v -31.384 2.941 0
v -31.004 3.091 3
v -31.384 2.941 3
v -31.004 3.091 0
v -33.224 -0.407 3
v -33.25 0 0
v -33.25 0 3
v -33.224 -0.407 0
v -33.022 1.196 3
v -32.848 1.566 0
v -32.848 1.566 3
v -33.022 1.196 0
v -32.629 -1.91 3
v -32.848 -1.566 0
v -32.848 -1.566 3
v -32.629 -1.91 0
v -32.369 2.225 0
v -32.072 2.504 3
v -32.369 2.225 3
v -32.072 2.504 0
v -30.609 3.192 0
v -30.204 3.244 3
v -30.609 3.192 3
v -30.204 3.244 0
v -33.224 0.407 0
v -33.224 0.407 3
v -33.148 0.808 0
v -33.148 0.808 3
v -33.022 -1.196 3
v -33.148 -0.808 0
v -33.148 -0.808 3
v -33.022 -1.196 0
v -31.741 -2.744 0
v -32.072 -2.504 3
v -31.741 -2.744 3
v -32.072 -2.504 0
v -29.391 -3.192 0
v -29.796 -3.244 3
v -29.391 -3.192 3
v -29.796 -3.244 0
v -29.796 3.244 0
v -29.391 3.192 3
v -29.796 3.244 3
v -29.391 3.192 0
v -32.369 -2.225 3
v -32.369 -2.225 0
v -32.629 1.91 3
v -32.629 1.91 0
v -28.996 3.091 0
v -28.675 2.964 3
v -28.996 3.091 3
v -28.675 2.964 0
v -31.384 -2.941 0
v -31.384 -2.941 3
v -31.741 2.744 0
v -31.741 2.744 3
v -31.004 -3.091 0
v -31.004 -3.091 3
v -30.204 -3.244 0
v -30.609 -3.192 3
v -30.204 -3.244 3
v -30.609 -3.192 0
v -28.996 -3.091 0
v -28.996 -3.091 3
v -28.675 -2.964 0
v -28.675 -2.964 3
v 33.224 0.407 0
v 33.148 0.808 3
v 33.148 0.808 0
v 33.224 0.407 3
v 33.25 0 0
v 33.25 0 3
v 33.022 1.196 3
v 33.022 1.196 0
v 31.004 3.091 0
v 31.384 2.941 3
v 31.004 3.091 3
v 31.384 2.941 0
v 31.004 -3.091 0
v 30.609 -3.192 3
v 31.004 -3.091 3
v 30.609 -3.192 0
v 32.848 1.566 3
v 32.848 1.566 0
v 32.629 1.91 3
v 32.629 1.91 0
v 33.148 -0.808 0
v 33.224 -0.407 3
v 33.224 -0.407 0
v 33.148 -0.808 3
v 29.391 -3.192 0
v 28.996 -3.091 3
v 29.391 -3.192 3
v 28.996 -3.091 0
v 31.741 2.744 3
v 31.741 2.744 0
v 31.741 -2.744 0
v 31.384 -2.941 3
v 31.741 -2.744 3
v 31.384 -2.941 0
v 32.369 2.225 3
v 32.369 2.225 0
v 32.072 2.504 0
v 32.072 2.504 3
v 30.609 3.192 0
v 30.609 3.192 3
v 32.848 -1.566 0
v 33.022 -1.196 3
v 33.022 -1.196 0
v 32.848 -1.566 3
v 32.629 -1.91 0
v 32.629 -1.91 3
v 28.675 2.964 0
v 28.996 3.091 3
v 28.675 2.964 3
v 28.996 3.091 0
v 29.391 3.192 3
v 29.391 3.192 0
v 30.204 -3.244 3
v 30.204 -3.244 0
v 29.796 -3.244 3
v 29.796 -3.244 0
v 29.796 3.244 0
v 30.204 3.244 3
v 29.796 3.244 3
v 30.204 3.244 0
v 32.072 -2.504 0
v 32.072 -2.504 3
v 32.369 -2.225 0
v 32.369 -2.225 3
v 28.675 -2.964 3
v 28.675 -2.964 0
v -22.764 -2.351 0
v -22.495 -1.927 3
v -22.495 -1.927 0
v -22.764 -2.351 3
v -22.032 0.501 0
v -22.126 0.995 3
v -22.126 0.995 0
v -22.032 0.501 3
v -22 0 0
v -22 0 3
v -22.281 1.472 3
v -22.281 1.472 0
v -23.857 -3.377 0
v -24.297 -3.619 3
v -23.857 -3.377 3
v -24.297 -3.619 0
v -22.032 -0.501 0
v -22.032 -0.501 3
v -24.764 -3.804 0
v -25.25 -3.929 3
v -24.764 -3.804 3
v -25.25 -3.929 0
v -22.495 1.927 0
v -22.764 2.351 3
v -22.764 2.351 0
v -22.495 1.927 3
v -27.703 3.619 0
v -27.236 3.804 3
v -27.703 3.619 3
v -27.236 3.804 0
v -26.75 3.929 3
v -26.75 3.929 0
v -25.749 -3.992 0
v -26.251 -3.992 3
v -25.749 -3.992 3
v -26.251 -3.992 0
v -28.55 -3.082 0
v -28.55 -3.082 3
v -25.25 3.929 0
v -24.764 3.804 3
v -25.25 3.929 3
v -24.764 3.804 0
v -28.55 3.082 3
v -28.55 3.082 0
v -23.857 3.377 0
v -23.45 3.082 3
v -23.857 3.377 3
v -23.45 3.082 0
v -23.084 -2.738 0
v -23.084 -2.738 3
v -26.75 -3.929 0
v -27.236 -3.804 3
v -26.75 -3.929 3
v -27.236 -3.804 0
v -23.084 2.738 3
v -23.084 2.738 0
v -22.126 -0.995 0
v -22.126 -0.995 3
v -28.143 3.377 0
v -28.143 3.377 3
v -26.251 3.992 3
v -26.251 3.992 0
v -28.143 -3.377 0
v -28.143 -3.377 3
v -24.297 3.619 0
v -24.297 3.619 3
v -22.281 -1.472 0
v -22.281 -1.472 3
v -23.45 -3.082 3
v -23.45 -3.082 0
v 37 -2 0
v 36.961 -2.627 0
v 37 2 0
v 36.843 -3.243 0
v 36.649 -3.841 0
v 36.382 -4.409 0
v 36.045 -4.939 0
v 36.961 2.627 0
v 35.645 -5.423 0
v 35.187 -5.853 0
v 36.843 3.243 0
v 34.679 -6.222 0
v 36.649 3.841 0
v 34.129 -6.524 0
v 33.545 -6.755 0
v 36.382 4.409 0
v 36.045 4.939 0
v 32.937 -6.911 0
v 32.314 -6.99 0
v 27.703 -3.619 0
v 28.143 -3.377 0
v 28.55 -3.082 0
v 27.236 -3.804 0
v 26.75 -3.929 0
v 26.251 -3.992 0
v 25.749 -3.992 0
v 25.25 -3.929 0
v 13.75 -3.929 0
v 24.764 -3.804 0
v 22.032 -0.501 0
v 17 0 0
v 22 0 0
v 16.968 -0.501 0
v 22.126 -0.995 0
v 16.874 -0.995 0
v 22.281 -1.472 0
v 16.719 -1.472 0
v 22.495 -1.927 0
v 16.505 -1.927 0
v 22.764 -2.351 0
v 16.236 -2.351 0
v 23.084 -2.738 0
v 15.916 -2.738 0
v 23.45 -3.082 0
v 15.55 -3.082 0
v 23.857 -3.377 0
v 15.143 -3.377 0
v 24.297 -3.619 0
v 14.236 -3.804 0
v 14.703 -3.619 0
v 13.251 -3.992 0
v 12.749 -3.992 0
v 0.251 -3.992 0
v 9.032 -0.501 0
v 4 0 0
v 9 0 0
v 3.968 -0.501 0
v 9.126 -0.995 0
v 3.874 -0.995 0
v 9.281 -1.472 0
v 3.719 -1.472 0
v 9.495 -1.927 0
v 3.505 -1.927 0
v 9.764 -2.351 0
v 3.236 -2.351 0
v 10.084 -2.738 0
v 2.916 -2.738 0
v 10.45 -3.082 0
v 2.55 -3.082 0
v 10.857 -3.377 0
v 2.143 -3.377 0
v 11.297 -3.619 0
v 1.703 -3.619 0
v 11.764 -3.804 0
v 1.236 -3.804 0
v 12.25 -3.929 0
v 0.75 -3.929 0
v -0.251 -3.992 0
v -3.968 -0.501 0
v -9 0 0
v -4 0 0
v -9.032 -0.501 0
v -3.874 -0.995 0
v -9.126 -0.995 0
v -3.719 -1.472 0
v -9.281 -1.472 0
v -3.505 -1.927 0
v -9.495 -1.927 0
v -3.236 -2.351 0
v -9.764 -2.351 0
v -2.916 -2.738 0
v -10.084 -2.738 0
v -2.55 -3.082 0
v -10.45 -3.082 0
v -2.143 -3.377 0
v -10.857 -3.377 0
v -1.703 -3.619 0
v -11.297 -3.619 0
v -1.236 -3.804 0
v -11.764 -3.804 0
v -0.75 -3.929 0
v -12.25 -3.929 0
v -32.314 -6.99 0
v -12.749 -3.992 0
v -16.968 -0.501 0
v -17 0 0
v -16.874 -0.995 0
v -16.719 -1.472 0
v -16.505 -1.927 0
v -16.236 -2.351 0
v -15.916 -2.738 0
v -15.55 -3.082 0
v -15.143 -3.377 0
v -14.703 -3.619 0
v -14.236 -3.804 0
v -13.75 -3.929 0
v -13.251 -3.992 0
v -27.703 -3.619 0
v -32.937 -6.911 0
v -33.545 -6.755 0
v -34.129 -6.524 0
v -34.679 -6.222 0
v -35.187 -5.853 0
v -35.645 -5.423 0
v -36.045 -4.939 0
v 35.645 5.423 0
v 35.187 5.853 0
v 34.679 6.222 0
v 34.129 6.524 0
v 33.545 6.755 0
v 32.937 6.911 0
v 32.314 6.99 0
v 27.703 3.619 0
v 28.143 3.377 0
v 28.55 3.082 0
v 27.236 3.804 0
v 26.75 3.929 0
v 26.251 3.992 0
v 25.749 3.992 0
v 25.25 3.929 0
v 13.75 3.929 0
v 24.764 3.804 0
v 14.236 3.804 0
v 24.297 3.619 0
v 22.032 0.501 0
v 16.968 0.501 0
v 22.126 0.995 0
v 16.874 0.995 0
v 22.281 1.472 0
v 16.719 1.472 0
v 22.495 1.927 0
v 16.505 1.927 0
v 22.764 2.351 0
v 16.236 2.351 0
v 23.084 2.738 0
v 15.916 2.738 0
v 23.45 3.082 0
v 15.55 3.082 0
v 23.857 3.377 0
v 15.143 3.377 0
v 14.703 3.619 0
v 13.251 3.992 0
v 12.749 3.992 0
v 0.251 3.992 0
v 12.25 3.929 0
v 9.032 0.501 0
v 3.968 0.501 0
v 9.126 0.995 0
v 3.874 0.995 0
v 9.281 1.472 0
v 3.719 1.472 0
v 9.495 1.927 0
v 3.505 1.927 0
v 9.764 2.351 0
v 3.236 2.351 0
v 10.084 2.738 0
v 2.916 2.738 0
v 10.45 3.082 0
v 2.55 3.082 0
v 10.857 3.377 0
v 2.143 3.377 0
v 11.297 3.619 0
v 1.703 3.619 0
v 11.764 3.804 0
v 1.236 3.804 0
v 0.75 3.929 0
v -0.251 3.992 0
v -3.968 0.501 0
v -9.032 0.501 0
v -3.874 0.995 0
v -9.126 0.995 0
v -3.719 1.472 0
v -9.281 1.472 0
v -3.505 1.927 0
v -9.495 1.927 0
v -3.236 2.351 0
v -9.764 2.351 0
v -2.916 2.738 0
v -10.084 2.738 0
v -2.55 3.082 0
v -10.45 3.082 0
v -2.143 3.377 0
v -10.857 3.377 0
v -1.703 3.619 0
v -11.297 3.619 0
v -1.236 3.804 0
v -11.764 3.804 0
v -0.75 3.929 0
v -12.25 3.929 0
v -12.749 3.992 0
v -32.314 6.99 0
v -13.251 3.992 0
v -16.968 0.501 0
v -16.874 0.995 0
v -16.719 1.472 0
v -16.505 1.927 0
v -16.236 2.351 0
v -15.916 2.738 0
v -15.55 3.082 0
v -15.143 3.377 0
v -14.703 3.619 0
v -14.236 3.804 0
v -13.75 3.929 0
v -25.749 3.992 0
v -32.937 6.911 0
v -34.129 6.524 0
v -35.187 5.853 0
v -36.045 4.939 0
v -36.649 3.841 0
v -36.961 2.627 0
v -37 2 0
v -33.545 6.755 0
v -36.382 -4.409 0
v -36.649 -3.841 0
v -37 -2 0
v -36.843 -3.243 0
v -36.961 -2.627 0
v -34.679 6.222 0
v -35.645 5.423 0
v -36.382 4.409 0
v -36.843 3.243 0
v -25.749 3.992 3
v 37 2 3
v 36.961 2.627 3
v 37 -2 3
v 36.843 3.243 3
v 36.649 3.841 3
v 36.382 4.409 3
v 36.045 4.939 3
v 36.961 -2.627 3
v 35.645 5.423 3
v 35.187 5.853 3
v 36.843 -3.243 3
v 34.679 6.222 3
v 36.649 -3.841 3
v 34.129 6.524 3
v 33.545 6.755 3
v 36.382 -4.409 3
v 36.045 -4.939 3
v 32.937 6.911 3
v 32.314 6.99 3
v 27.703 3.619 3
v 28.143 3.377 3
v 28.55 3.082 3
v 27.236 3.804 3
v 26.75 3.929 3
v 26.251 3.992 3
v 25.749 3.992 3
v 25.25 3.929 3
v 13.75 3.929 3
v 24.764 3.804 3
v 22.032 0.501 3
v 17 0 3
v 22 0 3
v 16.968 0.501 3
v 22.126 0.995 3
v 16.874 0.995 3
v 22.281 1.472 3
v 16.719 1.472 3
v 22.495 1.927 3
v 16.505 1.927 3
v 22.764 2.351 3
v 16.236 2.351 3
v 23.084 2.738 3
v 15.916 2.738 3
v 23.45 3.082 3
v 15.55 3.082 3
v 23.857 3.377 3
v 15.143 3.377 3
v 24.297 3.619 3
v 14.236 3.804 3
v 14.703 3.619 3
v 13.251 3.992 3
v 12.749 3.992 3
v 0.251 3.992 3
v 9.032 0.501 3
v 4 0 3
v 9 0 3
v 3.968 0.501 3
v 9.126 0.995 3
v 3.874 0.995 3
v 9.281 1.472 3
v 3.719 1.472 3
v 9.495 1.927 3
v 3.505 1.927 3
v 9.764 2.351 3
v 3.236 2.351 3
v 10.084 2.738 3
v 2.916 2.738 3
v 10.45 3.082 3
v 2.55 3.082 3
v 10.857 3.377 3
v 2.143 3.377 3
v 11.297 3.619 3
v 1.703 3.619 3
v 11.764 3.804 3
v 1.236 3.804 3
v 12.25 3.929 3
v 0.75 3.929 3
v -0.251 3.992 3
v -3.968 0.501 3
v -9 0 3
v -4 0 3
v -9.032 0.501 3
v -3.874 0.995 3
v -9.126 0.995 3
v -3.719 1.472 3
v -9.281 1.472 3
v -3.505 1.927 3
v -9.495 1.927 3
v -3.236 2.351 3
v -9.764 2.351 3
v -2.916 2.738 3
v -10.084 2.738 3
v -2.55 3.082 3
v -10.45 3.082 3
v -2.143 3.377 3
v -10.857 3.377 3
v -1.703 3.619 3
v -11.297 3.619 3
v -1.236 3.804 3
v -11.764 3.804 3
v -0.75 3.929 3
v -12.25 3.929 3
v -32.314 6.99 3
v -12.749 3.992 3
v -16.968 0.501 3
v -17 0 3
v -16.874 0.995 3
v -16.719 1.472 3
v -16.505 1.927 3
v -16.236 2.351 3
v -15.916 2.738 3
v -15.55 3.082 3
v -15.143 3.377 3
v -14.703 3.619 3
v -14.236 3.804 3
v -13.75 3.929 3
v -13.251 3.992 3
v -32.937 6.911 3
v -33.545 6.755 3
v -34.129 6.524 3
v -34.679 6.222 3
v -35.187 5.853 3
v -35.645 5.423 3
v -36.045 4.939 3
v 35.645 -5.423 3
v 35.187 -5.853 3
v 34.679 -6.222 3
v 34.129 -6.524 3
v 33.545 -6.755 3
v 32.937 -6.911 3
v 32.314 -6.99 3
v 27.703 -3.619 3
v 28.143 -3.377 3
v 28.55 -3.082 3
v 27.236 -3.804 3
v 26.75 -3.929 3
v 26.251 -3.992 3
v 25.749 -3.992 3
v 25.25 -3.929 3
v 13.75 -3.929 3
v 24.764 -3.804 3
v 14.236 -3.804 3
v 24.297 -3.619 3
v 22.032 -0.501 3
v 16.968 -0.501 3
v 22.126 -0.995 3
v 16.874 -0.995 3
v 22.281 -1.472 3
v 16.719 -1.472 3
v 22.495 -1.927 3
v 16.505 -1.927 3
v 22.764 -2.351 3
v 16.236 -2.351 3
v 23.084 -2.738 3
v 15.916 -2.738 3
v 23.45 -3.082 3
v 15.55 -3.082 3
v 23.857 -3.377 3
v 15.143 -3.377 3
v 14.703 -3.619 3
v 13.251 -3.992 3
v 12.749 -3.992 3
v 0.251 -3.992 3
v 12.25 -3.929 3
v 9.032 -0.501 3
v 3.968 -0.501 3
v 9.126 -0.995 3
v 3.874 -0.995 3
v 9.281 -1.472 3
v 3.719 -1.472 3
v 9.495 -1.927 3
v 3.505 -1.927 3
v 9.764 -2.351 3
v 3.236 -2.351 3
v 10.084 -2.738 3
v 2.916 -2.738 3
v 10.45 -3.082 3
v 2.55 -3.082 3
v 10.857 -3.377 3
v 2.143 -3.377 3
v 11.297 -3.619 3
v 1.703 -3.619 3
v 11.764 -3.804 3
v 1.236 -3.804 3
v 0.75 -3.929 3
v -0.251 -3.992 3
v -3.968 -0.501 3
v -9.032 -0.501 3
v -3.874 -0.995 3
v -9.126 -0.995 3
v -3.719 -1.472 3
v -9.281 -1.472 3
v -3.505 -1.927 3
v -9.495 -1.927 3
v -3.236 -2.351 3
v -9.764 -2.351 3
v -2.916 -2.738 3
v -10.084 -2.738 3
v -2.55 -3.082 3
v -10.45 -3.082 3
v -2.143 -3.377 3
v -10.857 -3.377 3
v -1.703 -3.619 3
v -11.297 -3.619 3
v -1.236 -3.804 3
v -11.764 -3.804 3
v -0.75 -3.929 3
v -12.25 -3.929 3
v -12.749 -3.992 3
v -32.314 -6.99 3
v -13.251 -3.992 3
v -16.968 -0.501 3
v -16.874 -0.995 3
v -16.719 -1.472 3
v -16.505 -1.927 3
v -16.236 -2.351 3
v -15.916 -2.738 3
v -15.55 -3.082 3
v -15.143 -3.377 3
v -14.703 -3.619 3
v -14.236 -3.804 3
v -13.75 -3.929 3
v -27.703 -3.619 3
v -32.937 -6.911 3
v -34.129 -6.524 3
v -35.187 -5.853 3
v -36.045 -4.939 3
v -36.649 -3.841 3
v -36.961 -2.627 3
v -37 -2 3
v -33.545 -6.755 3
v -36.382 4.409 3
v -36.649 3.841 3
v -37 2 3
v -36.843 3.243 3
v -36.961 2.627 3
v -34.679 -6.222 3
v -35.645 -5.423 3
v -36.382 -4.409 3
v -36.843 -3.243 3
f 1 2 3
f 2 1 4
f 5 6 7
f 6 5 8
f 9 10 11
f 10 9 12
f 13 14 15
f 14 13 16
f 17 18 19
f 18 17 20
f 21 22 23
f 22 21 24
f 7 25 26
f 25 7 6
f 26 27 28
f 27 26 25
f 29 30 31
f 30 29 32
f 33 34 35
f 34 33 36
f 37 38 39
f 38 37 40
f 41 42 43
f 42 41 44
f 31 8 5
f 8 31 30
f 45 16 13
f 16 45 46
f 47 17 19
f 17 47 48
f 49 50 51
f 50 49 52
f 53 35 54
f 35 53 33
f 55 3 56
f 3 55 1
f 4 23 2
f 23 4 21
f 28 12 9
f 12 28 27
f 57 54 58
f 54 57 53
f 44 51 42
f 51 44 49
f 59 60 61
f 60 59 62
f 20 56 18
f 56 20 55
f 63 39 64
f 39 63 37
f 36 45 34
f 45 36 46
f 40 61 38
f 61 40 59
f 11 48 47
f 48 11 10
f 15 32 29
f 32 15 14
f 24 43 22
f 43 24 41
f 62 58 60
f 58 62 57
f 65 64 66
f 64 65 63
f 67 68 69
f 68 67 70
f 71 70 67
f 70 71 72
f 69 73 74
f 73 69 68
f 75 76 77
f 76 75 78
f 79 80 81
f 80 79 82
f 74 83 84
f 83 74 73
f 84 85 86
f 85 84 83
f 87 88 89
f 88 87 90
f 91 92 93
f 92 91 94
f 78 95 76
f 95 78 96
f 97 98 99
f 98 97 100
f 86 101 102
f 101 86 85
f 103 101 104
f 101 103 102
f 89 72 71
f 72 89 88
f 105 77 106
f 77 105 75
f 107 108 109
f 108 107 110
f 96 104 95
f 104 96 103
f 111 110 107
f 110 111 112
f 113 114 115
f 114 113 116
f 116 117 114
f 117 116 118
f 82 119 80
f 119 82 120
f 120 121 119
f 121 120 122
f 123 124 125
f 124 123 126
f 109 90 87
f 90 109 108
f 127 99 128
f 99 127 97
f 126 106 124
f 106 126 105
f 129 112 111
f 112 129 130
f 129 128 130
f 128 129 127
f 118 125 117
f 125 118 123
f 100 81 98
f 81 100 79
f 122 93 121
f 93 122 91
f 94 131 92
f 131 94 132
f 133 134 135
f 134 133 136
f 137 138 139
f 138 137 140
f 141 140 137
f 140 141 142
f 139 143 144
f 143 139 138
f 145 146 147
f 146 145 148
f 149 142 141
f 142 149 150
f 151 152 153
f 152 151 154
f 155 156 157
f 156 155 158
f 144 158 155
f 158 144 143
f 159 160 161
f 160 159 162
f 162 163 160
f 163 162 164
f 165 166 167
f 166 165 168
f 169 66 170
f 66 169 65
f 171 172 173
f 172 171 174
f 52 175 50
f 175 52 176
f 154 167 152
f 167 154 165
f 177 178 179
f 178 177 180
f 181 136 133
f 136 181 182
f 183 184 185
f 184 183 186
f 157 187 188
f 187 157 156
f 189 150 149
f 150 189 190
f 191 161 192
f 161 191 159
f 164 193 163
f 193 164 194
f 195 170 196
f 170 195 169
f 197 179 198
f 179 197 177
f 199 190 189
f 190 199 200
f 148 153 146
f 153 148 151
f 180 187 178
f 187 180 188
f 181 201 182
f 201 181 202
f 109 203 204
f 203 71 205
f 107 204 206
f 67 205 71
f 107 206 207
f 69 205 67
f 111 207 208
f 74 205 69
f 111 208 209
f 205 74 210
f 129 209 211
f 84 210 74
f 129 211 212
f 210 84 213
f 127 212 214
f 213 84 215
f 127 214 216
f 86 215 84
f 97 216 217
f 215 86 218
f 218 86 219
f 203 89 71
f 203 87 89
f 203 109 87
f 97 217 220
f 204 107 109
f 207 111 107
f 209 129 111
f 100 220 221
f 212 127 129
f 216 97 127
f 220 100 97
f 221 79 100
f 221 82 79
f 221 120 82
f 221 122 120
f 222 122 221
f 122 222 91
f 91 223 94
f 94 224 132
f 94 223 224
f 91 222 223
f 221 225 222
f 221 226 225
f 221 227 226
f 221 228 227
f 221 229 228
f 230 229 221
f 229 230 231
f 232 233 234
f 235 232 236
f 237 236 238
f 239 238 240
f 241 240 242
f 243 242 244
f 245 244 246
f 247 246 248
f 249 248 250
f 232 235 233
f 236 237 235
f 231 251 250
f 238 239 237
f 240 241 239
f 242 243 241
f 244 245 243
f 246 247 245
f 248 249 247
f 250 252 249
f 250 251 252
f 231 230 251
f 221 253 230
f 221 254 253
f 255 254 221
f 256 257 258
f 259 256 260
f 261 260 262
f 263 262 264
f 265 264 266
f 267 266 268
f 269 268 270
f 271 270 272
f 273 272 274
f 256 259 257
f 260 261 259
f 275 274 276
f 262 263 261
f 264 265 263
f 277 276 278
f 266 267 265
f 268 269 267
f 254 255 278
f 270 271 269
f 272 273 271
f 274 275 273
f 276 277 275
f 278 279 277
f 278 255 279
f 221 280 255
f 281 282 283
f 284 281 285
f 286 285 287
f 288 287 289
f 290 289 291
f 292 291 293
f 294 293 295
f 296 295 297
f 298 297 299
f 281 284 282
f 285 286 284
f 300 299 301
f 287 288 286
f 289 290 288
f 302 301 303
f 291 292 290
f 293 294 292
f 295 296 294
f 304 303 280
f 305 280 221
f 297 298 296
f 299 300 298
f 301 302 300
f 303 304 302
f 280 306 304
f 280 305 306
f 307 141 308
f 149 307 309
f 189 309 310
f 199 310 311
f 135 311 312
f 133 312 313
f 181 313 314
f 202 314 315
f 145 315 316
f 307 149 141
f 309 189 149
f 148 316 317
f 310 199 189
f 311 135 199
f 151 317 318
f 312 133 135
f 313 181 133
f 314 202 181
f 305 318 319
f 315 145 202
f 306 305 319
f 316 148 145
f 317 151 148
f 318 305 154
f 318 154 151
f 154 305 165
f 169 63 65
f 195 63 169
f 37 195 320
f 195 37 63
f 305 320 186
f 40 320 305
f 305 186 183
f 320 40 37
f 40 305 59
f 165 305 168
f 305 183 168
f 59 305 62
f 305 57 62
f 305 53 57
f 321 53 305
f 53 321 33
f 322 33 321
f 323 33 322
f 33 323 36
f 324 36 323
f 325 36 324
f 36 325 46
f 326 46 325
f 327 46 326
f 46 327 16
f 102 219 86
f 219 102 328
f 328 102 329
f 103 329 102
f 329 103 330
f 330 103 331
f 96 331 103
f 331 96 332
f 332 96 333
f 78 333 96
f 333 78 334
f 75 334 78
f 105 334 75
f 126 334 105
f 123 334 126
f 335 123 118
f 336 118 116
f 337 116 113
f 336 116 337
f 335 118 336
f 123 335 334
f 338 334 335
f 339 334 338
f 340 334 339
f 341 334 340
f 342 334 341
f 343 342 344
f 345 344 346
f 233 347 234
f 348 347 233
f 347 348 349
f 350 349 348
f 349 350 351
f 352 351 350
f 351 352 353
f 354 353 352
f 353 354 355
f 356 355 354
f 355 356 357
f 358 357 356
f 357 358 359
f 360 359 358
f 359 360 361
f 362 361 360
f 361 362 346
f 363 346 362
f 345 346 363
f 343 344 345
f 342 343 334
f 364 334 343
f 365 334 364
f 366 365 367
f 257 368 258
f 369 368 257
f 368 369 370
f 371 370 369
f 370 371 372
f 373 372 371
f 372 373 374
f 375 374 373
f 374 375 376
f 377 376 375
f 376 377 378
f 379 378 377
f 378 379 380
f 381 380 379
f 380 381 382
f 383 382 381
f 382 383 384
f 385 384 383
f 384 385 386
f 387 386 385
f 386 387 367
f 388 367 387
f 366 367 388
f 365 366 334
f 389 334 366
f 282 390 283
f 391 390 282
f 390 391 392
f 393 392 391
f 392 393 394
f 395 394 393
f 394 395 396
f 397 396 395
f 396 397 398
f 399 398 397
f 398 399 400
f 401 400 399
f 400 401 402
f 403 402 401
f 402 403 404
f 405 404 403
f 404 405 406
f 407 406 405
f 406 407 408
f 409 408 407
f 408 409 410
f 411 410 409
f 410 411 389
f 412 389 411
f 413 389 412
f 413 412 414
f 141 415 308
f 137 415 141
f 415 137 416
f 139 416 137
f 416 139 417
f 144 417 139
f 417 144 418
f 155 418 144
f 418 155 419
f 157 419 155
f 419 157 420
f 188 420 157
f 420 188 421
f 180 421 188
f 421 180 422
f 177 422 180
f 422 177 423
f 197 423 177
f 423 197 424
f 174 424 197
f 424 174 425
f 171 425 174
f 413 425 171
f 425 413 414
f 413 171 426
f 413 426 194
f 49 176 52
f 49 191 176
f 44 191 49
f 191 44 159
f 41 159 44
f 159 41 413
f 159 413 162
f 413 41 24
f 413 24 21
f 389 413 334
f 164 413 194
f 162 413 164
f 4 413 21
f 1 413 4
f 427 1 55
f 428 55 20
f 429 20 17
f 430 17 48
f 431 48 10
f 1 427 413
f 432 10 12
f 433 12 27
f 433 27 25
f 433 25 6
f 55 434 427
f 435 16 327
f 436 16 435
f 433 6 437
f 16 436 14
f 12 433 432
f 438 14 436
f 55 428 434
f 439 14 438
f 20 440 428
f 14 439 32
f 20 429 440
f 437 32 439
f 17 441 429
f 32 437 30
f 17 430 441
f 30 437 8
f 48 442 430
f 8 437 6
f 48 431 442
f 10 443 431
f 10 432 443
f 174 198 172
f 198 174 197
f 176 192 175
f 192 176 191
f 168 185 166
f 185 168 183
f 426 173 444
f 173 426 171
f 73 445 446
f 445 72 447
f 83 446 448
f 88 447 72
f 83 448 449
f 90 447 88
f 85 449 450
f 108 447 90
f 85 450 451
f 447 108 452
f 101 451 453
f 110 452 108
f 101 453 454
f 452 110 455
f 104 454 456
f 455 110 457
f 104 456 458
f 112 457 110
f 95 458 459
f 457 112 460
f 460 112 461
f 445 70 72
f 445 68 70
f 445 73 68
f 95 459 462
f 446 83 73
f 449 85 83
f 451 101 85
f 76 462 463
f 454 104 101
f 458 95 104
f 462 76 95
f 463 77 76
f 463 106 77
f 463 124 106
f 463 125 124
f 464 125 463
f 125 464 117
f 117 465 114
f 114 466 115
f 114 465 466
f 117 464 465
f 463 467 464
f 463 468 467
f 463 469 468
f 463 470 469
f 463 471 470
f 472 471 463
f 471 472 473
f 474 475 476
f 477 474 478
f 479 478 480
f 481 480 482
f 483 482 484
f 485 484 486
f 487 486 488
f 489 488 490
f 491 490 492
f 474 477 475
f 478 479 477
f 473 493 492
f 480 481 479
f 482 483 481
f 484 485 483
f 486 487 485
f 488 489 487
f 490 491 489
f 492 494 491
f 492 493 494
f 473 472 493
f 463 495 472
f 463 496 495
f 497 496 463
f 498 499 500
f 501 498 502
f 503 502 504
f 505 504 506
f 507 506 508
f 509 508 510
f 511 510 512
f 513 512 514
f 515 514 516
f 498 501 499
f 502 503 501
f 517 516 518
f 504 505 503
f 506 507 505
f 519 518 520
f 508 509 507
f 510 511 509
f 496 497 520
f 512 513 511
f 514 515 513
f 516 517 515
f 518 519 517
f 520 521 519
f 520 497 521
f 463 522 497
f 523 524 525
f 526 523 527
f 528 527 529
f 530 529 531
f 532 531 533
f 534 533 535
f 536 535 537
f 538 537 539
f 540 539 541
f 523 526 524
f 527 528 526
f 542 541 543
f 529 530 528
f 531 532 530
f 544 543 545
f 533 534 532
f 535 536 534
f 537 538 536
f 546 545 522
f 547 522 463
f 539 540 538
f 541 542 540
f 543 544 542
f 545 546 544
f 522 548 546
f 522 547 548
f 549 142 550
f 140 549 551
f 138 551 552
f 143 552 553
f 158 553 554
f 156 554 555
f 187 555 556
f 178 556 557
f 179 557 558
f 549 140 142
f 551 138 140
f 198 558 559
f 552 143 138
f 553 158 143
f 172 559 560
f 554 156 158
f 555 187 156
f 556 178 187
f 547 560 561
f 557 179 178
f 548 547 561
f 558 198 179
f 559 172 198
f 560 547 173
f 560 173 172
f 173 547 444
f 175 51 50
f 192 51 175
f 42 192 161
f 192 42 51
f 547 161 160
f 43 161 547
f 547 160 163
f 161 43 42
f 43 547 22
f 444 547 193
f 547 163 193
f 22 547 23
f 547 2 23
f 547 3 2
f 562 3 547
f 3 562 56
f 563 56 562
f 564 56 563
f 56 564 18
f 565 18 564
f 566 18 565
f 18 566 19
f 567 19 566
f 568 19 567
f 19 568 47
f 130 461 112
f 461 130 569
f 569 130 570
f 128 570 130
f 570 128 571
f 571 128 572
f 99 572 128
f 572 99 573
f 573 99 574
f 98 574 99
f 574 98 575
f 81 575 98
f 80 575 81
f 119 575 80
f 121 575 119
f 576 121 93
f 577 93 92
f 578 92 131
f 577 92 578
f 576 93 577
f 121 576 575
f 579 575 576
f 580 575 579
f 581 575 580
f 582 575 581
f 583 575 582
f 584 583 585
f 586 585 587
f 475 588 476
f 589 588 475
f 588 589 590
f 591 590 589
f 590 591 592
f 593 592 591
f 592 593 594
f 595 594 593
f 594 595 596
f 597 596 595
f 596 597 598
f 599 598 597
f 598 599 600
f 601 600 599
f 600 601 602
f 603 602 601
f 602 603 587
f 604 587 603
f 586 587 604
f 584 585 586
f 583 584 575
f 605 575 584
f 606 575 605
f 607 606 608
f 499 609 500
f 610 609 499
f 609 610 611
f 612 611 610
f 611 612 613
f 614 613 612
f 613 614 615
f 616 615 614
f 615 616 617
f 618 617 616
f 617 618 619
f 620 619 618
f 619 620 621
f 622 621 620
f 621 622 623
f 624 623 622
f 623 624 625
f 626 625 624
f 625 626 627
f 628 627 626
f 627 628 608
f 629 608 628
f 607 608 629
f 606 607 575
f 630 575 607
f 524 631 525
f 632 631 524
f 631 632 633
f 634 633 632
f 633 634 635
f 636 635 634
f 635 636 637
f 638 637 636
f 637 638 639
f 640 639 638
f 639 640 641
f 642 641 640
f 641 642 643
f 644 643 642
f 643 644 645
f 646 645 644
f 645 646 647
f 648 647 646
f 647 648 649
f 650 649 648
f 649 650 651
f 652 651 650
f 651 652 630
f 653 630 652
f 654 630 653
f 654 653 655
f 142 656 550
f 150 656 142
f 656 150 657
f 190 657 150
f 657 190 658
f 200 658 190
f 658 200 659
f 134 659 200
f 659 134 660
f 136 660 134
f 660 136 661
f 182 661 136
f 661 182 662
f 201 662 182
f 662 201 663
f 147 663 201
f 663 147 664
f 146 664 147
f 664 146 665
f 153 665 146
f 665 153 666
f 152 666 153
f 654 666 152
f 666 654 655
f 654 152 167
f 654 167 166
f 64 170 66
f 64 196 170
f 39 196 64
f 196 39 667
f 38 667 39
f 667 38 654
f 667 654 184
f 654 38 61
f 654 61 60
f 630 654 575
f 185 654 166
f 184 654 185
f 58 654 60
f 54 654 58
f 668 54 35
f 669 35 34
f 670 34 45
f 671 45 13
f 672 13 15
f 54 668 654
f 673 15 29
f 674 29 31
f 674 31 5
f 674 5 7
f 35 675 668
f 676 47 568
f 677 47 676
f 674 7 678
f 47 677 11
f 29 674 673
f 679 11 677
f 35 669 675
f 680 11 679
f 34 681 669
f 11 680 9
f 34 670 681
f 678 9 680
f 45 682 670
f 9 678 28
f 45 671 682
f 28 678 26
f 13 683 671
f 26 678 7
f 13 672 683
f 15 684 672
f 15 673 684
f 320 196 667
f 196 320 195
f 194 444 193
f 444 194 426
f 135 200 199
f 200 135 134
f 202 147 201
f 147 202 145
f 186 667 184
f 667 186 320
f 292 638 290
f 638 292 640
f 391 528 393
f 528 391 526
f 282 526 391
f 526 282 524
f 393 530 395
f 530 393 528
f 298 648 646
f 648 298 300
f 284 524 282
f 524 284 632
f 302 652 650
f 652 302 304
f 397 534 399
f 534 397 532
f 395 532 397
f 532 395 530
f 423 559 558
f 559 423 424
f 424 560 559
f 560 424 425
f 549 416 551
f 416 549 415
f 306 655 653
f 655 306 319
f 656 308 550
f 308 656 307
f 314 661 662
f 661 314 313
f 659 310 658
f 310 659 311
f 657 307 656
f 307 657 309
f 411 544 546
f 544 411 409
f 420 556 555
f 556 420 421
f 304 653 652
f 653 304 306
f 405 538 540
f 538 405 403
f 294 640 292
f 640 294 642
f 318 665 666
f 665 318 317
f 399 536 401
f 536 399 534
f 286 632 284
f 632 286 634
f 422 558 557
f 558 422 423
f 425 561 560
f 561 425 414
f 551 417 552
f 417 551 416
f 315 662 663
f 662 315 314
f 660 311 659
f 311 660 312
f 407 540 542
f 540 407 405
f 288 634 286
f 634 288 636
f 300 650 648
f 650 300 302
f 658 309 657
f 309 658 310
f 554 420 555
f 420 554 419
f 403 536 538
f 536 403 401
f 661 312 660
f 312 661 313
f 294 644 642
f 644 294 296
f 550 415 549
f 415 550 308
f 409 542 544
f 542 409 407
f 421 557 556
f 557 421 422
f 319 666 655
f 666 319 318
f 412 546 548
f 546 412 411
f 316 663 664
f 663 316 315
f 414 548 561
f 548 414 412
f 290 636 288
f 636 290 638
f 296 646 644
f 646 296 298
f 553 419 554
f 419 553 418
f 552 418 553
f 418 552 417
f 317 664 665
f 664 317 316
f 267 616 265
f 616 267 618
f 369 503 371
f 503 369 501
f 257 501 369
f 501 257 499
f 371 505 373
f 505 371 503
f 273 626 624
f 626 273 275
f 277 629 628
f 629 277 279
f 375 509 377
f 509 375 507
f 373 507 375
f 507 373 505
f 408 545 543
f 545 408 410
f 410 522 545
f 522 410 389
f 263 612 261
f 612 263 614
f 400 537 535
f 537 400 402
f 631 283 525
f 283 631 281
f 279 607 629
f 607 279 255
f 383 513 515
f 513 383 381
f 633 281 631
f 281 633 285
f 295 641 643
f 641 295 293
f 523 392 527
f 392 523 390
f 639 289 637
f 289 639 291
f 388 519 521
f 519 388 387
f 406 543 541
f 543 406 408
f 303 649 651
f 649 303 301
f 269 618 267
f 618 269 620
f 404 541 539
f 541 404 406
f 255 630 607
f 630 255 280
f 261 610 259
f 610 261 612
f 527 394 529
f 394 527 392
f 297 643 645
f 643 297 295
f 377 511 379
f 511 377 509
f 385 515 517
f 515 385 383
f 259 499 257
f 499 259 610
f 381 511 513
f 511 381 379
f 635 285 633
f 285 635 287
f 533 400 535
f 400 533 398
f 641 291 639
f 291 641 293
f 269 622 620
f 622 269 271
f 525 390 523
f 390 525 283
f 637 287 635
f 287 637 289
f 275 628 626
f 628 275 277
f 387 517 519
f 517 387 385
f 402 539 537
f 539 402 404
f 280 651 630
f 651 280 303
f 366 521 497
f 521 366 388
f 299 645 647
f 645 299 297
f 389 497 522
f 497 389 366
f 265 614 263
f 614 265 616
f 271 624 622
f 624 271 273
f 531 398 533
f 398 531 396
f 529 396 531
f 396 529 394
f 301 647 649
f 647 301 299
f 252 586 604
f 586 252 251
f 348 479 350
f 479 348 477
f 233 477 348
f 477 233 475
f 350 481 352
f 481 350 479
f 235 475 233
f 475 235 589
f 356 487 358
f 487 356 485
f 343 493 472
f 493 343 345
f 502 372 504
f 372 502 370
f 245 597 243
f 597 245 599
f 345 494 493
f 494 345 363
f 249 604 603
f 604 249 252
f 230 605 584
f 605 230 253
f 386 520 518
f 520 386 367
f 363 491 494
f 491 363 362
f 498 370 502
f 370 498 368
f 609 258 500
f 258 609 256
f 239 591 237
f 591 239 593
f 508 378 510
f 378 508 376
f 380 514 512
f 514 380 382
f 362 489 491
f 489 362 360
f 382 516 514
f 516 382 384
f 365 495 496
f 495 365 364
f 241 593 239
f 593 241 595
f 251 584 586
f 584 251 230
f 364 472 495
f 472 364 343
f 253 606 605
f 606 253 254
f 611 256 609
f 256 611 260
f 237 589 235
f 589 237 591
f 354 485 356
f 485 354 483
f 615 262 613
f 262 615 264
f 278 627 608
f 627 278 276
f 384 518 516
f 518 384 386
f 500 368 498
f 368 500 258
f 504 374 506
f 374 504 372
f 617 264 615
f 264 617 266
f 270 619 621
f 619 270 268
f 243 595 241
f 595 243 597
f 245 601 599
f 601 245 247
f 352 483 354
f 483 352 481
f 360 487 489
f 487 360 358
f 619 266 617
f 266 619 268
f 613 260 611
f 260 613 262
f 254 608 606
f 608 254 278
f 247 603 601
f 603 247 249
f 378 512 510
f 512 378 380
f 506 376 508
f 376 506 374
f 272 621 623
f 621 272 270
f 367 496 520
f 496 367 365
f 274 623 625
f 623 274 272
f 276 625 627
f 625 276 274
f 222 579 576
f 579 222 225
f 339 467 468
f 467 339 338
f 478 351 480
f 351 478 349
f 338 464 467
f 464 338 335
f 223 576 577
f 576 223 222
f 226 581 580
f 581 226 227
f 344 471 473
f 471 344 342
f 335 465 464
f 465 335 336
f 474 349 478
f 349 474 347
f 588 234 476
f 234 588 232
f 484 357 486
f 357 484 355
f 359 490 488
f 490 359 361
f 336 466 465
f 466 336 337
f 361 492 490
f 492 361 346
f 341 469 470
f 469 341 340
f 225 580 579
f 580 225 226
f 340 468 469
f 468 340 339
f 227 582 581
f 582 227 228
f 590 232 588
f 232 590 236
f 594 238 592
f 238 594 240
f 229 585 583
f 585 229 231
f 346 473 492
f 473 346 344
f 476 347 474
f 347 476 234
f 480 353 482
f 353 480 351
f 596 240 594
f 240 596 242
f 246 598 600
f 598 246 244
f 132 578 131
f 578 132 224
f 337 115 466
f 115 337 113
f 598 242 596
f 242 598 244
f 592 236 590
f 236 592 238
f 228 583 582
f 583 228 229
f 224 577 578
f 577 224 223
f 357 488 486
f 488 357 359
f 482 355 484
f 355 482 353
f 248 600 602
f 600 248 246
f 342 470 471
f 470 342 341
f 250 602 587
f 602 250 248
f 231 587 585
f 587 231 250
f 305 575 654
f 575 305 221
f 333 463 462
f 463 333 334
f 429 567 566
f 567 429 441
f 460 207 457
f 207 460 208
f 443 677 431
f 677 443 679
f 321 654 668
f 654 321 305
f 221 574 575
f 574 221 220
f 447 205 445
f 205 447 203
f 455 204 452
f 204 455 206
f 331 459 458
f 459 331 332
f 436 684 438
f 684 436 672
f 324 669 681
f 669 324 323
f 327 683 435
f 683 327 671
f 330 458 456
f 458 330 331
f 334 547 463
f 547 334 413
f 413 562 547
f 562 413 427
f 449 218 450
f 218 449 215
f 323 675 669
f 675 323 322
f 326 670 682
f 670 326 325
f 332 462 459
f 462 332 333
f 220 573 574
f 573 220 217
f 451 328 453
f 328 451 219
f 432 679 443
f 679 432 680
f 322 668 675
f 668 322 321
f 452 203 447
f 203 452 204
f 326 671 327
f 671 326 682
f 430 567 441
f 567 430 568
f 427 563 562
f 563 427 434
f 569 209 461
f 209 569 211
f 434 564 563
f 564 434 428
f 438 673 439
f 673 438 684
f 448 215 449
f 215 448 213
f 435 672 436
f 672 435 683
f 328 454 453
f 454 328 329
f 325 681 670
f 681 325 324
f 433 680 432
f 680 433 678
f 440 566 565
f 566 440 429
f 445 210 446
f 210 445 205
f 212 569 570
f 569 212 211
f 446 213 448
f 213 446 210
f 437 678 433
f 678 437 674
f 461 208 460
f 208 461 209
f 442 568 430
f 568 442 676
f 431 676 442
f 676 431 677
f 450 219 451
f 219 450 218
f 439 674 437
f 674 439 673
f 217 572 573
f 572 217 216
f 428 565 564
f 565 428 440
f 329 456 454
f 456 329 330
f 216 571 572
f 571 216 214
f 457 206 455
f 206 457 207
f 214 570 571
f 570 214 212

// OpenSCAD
$fn = 50;

difference() {
	union() {
		hull() {
			translate(v = [-32.0, 2.0, 0]) {
				cylinder(h = 3, r = 5);
			}
			translate(v = [32.0, 2.0, 0]) {
				cylinder(h = 3, r = 5);
			}
			translate(v = [-32.0, -2.0, 0]) {
				cylinder(h = 3, r = 5);
			}
			translate(v = [32.0, -2.0, 0]) {
				cylinder(h = 3, r = 5);
			}
		}
	}
	union() {
		translate(v = [-30.0, 0.0, -100.0]) {
			cylinder(h = 200, r = 3.25);
		}
		translate(v = [30.0, 0.0, -100.0]) {
			cylinder(h = 200, r = 3.25);
		}
		translate(v = [-30.0, 0.0, -100.0]) {
			cylinder(h = 200, r = 1.8);
		}
		translate(v = [30.0, 0.0, -100.0]) {
			cylinder(h = 200, r = 1.8);
		}
		translate(v = [-26.0, 0, 0.0]) {
			cylinder(h = 3, r = 4.0);
		}
		translate(v = [-13.0, 0, 0.0]) {
			cylinder(h = 3, r = 4.0);
		}
		cylinder(h = 3, r = 4.0);
		translate(v = [13.0, 0, 0.0]) {
			cylinder(h = 3, r = 4.0);
		}
		translate(v = [26.0, 0, 0.0]) {
			cylinder(h = 3, r = 4.0);
		}
	}
}
